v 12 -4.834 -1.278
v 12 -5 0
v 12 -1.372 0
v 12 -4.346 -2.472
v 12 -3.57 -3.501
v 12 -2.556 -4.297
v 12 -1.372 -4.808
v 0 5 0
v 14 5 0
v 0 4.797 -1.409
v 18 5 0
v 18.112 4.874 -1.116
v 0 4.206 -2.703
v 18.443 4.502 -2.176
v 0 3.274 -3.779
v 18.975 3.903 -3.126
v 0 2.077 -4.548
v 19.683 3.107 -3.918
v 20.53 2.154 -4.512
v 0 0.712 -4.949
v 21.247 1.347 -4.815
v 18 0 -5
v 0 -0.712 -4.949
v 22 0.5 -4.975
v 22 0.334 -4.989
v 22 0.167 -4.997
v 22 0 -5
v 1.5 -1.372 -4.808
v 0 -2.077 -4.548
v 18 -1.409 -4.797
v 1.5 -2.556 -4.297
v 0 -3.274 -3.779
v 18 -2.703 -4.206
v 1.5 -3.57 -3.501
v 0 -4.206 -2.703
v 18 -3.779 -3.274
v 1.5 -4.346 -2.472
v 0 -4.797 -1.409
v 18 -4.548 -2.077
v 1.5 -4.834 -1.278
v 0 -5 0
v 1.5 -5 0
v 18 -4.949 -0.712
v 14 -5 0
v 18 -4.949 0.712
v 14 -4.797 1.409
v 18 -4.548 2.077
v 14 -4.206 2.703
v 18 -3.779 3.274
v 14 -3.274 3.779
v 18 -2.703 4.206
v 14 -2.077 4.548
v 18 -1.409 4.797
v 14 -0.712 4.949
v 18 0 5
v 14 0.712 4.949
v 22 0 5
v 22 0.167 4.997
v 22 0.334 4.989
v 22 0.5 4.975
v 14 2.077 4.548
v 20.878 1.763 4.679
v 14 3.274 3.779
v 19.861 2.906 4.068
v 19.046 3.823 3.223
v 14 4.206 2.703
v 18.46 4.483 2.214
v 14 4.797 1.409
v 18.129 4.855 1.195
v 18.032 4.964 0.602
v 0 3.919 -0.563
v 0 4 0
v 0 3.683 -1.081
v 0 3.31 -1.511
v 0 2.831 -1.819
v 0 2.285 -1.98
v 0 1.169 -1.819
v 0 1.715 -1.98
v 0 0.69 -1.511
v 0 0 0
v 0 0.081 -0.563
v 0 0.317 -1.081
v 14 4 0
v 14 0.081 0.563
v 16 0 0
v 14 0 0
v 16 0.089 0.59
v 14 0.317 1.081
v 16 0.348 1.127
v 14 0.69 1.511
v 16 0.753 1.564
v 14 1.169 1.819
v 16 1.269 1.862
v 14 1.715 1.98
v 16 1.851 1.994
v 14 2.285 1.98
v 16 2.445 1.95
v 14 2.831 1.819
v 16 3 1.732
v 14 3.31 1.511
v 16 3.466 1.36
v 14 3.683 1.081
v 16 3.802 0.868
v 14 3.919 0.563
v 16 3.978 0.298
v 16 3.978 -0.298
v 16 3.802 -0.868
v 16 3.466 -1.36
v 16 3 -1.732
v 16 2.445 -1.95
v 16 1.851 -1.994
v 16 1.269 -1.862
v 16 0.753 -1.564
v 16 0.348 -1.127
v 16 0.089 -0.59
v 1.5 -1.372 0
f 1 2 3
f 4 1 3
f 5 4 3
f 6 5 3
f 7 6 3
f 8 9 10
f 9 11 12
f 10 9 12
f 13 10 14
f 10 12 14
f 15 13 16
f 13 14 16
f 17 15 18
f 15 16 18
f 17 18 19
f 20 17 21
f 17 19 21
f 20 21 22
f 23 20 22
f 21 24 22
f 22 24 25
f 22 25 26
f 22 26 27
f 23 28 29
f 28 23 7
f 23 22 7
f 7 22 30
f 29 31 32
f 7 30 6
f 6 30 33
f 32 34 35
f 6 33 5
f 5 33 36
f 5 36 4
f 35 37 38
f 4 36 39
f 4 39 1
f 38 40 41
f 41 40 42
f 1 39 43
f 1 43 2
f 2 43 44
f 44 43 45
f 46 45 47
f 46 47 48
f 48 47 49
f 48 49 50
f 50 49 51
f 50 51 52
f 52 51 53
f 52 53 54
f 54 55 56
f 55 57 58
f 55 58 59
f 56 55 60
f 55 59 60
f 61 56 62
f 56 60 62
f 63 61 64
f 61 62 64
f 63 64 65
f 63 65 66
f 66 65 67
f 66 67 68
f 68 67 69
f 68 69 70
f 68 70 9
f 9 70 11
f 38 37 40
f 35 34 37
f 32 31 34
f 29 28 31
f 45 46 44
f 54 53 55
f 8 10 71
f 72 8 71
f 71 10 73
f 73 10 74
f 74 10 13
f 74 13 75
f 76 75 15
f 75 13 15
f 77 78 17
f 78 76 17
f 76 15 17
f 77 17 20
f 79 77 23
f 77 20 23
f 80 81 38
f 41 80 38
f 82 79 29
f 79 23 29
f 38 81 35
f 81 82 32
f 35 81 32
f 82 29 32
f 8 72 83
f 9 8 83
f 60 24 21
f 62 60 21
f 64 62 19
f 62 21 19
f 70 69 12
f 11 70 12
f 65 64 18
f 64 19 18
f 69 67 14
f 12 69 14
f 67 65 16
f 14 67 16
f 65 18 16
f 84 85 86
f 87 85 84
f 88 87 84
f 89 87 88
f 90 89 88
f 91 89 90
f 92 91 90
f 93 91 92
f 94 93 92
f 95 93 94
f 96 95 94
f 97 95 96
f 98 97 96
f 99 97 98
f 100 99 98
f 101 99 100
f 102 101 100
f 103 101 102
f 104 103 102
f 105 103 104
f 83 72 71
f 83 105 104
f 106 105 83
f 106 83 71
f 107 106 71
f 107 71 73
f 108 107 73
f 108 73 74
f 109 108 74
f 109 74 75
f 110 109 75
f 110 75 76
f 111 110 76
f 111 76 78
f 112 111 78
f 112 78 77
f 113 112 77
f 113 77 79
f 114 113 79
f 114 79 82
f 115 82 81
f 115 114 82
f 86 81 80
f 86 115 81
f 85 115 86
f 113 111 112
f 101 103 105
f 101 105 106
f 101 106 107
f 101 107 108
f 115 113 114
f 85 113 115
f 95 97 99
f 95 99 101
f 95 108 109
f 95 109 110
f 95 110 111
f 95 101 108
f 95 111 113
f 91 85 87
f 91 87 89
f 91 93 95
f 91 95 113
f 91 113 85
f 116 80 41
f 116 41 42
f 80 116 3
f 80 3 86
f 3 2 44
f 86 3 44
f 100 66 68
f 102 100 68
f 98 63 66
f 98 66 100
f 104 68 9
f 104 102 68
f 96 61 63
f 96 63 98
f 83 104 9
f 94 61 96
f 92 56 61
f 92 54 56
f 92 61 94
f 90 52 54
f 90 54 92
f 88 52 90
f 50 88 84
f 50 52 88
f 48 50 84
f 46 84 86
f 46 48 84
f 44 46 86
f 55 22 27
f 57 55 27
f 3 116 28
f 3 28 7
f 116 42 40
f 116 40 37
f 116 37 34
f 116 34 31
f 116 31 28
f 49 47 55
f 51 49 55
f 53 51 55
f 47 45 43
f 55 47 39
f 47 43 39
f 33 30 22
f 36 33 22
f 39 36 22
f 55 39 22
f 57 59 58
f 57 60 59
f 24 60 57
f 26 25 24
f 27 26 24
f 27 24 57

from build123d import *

# Parameters (mm, degrees)
SKETCH_1_W               = 22
SKETCH_1_H               = 5
CUT_EXTRUDE_1_DEPTH      = 24.108440017
CUT_EXTRUDE_1_DEPTH_BACK = 24.108440017
SKETCH_3_W               = 4
SKETCH_3_H               = 5
CUT_EXTRUDE_4_DEPTH      = 24.108440017
CUT_EXTRUDE_4_DEPTH_BACK = 24.108440017
SKETCH_4_W               = 14
SKETCH_4_H               = 5
CUT_EXTRUDE_5_DEPTH      = 24.108440017
CUT_EXTRUDE_5_DEPTH_BACK = 16
SKETCH_5_R               = 2
SKETCH_6_W               = 10.5
SKETCH_6_H               = 3.627911102
CUT_EXTRUDE_6_DEPTH      = 16


with BuildPart() as part:
    # 草图1 → 旋转1 (revolve)
    with BuildSketch(Plane.XY):
        with Locations((11, 2.5)):
            Rectangle(SKETCH_1_W, SKETCH_1_H)
    revolve(axis=Axis((22, 0, 0), (-1, 0, 0)))

    # 草图3 → 切除-拉伸1 (cut, two sides: drawn at the far end of the back side and taken through both)
    with BuildSketch(Plane.XY.offset(-CUT_EXTRUDE_1_DEPTH_BACK)):
        with Locations((20, -2.5)):
            Rectangle(SKETCH_3_W, SKETCH_3_H)
        Polygon((22, 0.5), (18, 5), (22, 5), align=None)
    extrude(amount=CUT_EXTRUDE_1_DEPTH + CUT_EXTRUDE_1_DEPTH_BACK, mode=Mode.SUBTRACT)

    # 草图4 → 切除-拉伸4 (cut, two sides: drawn at the far end of the back side and taken through both)
    with BuildSketch(Plane(origin=(0, 0, 0), x_dir=(1, 0, 0), z_dir=(0, 1, 0)).offset(-CUT_EXTRUDE_4_DEPTH_BACK)):
        with Locations((7, -2.5)):
            Rectangle(SKETCH_4_W, SKETCH_4_H)
    extrude(amount=CUT_EXTRUDE_4_DEPTH + CUT_EXTRUDE_4_DEPTH_BACK, mode=Mode.SUBTRACT)

    # 草图5 → 切除-拉伸5 (cut, two sides: drawn at the far end of the back side and taken through both)
    with BuildSketch(Plane.ZY.offset(-CUT_EXTRUDE_5_DEPTH_BACK)):
        with Locations(Location((0, 2, 0), (0, 0, 270))):
            Circle(SKETCH_5_R)
    extrude(amount=CUT_EXTRUDE_5_DEPTH + CUT_EXTRUDE_5_DEPTH_BACK, mode=Mode.SUBTRACT)

    # 草图6 → 切除-拉伸6 (cut)
    with BuildSketch(Plane.XY):
        with Locations((6.75, -3.186044449)):
            Rectangle(SKETCH_6_W, SKETCH_6_H)
    extrude(amount=-CUT_EXTRUDE_6_DEPTH, mode=Mode.SUBTRACT)


solid = part.part
